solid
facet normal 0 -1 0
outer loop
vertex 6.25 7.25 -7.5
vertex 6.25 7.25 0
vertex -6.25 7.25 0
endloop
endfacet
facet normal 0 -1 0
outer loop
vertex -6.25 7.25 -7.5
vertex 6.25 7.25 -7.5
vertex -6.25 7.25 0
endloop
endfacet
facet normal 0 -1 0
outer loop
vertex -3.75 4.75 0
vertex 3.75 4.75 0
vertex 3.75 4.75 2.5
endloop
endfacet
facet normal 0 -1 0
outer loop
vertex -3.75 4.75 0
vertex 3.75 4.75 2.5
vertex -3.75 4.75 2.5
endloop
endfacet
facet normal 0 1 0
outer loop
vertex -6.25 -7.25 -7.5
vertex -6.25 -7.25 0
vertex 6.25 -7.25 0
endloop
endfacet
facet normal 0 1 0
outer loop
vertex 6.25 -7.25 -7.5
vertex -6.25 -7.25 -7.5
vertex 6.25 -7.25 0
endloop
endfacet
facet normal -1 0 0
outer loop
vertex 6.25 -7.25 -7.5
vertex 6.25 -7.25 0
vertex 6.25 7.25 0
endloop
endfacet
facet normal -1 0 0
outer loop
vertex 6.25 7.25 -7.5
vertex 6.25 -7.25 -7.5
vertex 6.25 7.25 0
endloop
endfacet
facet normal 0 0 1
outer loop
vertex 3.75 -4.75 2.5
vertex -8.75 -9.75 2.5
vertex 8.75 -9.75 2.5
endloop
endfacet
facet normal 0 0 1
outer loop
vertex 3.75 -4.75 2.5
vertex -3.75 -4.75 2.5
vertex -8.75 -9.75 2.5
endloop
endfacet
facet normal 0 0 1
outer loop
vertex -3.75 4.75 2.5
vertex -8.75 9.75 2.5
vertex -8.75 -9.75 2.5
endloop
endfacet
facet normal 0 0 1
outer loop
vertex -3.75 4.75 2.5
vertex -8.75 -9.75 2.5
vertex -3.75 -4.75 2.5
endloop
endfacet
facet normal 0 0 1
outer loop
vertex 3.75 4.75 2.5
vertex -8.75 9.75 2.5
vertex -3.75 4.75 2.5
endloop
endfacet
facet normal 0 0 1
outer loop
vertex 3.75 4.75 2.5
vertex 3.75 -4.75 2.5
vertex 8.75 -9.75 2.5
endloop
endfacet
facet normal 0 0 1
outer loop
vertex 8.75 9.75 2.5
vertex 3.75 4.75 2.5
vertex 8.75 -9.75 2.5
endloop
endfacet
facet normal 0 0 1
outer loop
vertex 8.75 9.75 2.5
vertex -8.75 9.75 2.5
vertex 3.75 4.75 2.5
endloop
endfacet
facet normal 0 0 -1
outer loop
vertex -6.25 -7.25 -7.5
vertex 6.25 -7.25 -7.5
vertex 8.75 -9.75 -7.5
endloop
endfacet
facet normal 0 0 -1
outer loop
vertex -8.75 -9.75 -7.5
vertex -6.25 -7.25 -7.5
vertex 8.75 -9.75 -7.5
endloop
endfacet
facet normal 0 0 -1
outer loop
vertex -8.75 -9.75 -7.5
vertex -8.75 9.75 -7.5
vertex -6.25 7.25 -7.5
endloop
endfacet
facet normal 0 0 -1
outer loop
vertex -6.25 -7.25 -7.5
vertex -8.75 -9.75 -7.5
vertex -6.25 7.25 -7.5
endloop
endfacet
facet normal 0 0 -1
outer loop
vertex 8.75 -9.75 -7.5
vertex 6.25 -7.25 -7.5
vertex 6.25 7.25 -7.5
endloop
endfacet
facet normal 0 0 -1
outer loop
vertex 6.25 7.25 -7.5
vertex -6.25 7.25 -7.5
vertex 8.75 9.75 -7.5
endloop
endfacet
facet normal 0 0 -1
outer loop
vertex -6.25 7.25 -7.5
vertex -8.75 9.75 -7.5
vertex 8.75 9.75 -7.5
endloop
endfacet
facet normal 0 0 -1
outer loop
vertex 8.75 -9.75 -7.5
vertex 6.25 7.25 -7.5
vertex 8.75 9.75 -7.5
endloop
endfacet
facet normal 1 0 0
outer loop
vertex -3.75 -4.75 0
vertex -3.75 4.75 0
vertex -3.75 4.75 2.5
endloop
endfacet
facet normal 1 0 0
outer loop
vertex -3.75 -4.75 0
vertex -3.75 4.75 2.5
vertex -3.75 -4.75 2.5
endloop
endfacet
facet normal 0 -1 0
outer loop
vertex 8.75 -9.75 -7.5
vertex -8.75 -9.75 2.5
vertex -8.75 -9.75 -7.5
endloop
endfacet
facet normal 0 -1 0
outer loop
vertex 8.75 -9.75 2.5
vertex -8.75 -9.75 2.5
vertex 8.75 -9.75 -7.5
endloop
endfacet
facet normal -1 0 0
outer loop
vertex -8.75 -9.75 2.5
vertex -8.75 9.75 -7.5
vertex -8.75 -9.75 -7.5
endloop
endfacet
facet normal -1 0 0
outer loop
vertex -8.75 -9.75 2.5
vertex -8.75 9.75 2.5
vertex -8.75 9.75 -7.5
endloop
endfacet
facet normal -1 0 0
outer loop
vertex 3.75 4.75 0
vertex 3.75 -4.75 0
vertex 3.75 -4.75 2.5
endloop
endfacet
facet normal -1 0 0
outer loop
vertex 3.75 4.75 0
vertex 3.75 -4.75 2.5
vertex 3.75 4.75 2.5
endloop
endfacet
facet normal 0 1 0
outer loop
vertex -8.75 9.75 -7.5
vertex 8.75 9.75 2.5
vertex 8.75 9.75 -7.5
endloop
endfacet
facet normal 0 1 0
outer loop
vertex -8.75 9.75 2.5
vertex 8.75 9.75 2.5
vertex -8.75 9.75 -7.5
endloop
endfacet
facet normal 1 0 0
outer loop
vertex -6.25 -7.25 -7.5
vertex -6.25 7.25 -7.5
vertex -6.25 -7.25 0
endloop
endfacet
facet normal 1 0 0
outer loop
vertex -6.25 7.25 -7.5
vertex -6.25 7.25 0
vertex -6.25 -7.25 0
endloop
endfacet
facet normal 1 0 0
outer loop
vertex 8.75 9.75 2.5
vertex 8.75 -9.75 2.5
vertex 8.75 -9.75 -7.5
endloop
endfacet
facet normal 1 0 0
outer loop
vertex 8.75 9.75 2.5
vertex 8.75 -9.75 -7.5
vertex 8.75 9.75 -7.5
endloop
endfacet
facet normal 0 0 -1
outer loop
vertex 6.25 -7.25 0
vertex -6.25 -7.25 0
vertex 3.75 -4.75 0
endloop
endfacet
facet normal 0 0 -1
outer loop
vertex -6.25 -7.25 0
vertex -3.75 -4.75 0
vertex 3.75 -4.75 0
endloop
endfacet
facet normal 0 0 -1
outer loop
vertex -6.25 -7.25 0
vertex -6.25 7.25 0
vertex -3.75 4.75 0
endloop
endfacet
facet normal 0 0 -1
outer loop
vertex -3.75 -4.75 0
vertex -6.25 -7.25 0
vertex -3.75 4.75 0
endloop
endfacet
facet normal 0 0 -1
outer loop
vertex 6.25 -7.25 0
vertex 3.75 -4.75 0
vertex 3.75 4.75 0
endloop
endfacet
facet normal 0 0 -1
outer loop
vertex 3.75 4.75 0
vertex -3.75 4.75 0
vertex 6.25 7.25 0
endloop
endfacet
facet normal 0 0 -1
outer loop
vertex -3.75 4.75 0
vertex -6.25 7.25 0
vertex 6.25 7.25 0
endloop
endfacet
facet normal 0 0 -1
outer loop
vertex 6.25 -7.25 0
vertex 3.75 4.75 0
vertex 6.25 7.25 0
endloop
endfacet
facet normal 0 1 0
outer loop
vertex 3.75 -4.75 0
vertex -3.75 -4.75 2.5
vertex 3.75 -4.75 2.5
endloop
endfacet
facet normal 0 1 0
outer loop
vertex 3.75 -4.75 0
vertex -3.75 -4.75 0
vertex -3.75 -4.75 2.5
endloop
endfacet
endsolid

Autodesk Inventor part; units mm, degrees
ref_plane "YZ Plane" through (0, 0, 0) normal (1, 0, 0) x (0, 1, 0)
ref_plane "XZ Plane" through (0, 0, 0) normal (0, 1, 0) x (-1, 0, 0)
ref_plane "XY Plane" through (0, 0, 0) normal (0, 0, 1) x (1, 0, 0)
sketch "Sketch1" plane through (0, 0, 0) normal (0, 0, 1) x (1, 0, 0)
  line L0 (-6.25, -7.25) -> (6.25, -7.25)
  line L1 (6.25, -7.25) -> (6.25, 7.25)
  line L2 (6.25, 7.25) -> (-6.25, 7.25)
  line L3 (-6.25, 7.25) -> (-6.25, -7.25)
  line L4 (-6.25, -7.25) -> (6.25, 7.25) construction
  line L5 (6.25, -7.25) -> (-6.25, 7.25) construction
  line L6 (-8.75, -9.75) -> (8.75, -9.75)
  line L7 (8.75, -9.75) -> (8.75, 9.75)
  line L8 (8.75, 9.75) -> (-8.75, 9.75)
  line L9 (-8.75, 9.75) -> (-8.75, -9.75)
  line L10 (-8.75, -9.75) -> (8.75, 9.75) construction
  line L11 (8.75, -9.75) -> (-8.75, 9.75) construction
  line L12 (-3.75, -4.75) -> (3.75, -4.75)
  line L13 (3.75, -4.75) -> (3.75, 4.75)
  line L14 (3.75, 4.75) -> (-3.75, 4.75)
  line L15 (-3.75, 4.75) -> (-3.75, -4.75)
  line L16 (-3.75, -4.75) -> (3.75, 4.75) construction
  line L17 (3.75, -4.75) -> (-3.75, 4.75) construction
  point P0 (0, 0)
  dimension "d0" = 12.5
  dimension "d1" = 14.5
  dimension "d2" = 17.5
  dimension "d3" = 19.5
  dimension "d4" = 7.5
  dimension "d5" = 9.5
extrude "Extrusion1" add sketch "Sketch1" along normal blind 2.5 contours L3 L2 L1 L0 | L9 L8 L7 L6
extrude "Extrusion2" add sketch "Sketch1" against normal blind 7.5 contours L9 L8 L7 L6
properties part number "Adafruit_1528_4663-ND_House_01"
